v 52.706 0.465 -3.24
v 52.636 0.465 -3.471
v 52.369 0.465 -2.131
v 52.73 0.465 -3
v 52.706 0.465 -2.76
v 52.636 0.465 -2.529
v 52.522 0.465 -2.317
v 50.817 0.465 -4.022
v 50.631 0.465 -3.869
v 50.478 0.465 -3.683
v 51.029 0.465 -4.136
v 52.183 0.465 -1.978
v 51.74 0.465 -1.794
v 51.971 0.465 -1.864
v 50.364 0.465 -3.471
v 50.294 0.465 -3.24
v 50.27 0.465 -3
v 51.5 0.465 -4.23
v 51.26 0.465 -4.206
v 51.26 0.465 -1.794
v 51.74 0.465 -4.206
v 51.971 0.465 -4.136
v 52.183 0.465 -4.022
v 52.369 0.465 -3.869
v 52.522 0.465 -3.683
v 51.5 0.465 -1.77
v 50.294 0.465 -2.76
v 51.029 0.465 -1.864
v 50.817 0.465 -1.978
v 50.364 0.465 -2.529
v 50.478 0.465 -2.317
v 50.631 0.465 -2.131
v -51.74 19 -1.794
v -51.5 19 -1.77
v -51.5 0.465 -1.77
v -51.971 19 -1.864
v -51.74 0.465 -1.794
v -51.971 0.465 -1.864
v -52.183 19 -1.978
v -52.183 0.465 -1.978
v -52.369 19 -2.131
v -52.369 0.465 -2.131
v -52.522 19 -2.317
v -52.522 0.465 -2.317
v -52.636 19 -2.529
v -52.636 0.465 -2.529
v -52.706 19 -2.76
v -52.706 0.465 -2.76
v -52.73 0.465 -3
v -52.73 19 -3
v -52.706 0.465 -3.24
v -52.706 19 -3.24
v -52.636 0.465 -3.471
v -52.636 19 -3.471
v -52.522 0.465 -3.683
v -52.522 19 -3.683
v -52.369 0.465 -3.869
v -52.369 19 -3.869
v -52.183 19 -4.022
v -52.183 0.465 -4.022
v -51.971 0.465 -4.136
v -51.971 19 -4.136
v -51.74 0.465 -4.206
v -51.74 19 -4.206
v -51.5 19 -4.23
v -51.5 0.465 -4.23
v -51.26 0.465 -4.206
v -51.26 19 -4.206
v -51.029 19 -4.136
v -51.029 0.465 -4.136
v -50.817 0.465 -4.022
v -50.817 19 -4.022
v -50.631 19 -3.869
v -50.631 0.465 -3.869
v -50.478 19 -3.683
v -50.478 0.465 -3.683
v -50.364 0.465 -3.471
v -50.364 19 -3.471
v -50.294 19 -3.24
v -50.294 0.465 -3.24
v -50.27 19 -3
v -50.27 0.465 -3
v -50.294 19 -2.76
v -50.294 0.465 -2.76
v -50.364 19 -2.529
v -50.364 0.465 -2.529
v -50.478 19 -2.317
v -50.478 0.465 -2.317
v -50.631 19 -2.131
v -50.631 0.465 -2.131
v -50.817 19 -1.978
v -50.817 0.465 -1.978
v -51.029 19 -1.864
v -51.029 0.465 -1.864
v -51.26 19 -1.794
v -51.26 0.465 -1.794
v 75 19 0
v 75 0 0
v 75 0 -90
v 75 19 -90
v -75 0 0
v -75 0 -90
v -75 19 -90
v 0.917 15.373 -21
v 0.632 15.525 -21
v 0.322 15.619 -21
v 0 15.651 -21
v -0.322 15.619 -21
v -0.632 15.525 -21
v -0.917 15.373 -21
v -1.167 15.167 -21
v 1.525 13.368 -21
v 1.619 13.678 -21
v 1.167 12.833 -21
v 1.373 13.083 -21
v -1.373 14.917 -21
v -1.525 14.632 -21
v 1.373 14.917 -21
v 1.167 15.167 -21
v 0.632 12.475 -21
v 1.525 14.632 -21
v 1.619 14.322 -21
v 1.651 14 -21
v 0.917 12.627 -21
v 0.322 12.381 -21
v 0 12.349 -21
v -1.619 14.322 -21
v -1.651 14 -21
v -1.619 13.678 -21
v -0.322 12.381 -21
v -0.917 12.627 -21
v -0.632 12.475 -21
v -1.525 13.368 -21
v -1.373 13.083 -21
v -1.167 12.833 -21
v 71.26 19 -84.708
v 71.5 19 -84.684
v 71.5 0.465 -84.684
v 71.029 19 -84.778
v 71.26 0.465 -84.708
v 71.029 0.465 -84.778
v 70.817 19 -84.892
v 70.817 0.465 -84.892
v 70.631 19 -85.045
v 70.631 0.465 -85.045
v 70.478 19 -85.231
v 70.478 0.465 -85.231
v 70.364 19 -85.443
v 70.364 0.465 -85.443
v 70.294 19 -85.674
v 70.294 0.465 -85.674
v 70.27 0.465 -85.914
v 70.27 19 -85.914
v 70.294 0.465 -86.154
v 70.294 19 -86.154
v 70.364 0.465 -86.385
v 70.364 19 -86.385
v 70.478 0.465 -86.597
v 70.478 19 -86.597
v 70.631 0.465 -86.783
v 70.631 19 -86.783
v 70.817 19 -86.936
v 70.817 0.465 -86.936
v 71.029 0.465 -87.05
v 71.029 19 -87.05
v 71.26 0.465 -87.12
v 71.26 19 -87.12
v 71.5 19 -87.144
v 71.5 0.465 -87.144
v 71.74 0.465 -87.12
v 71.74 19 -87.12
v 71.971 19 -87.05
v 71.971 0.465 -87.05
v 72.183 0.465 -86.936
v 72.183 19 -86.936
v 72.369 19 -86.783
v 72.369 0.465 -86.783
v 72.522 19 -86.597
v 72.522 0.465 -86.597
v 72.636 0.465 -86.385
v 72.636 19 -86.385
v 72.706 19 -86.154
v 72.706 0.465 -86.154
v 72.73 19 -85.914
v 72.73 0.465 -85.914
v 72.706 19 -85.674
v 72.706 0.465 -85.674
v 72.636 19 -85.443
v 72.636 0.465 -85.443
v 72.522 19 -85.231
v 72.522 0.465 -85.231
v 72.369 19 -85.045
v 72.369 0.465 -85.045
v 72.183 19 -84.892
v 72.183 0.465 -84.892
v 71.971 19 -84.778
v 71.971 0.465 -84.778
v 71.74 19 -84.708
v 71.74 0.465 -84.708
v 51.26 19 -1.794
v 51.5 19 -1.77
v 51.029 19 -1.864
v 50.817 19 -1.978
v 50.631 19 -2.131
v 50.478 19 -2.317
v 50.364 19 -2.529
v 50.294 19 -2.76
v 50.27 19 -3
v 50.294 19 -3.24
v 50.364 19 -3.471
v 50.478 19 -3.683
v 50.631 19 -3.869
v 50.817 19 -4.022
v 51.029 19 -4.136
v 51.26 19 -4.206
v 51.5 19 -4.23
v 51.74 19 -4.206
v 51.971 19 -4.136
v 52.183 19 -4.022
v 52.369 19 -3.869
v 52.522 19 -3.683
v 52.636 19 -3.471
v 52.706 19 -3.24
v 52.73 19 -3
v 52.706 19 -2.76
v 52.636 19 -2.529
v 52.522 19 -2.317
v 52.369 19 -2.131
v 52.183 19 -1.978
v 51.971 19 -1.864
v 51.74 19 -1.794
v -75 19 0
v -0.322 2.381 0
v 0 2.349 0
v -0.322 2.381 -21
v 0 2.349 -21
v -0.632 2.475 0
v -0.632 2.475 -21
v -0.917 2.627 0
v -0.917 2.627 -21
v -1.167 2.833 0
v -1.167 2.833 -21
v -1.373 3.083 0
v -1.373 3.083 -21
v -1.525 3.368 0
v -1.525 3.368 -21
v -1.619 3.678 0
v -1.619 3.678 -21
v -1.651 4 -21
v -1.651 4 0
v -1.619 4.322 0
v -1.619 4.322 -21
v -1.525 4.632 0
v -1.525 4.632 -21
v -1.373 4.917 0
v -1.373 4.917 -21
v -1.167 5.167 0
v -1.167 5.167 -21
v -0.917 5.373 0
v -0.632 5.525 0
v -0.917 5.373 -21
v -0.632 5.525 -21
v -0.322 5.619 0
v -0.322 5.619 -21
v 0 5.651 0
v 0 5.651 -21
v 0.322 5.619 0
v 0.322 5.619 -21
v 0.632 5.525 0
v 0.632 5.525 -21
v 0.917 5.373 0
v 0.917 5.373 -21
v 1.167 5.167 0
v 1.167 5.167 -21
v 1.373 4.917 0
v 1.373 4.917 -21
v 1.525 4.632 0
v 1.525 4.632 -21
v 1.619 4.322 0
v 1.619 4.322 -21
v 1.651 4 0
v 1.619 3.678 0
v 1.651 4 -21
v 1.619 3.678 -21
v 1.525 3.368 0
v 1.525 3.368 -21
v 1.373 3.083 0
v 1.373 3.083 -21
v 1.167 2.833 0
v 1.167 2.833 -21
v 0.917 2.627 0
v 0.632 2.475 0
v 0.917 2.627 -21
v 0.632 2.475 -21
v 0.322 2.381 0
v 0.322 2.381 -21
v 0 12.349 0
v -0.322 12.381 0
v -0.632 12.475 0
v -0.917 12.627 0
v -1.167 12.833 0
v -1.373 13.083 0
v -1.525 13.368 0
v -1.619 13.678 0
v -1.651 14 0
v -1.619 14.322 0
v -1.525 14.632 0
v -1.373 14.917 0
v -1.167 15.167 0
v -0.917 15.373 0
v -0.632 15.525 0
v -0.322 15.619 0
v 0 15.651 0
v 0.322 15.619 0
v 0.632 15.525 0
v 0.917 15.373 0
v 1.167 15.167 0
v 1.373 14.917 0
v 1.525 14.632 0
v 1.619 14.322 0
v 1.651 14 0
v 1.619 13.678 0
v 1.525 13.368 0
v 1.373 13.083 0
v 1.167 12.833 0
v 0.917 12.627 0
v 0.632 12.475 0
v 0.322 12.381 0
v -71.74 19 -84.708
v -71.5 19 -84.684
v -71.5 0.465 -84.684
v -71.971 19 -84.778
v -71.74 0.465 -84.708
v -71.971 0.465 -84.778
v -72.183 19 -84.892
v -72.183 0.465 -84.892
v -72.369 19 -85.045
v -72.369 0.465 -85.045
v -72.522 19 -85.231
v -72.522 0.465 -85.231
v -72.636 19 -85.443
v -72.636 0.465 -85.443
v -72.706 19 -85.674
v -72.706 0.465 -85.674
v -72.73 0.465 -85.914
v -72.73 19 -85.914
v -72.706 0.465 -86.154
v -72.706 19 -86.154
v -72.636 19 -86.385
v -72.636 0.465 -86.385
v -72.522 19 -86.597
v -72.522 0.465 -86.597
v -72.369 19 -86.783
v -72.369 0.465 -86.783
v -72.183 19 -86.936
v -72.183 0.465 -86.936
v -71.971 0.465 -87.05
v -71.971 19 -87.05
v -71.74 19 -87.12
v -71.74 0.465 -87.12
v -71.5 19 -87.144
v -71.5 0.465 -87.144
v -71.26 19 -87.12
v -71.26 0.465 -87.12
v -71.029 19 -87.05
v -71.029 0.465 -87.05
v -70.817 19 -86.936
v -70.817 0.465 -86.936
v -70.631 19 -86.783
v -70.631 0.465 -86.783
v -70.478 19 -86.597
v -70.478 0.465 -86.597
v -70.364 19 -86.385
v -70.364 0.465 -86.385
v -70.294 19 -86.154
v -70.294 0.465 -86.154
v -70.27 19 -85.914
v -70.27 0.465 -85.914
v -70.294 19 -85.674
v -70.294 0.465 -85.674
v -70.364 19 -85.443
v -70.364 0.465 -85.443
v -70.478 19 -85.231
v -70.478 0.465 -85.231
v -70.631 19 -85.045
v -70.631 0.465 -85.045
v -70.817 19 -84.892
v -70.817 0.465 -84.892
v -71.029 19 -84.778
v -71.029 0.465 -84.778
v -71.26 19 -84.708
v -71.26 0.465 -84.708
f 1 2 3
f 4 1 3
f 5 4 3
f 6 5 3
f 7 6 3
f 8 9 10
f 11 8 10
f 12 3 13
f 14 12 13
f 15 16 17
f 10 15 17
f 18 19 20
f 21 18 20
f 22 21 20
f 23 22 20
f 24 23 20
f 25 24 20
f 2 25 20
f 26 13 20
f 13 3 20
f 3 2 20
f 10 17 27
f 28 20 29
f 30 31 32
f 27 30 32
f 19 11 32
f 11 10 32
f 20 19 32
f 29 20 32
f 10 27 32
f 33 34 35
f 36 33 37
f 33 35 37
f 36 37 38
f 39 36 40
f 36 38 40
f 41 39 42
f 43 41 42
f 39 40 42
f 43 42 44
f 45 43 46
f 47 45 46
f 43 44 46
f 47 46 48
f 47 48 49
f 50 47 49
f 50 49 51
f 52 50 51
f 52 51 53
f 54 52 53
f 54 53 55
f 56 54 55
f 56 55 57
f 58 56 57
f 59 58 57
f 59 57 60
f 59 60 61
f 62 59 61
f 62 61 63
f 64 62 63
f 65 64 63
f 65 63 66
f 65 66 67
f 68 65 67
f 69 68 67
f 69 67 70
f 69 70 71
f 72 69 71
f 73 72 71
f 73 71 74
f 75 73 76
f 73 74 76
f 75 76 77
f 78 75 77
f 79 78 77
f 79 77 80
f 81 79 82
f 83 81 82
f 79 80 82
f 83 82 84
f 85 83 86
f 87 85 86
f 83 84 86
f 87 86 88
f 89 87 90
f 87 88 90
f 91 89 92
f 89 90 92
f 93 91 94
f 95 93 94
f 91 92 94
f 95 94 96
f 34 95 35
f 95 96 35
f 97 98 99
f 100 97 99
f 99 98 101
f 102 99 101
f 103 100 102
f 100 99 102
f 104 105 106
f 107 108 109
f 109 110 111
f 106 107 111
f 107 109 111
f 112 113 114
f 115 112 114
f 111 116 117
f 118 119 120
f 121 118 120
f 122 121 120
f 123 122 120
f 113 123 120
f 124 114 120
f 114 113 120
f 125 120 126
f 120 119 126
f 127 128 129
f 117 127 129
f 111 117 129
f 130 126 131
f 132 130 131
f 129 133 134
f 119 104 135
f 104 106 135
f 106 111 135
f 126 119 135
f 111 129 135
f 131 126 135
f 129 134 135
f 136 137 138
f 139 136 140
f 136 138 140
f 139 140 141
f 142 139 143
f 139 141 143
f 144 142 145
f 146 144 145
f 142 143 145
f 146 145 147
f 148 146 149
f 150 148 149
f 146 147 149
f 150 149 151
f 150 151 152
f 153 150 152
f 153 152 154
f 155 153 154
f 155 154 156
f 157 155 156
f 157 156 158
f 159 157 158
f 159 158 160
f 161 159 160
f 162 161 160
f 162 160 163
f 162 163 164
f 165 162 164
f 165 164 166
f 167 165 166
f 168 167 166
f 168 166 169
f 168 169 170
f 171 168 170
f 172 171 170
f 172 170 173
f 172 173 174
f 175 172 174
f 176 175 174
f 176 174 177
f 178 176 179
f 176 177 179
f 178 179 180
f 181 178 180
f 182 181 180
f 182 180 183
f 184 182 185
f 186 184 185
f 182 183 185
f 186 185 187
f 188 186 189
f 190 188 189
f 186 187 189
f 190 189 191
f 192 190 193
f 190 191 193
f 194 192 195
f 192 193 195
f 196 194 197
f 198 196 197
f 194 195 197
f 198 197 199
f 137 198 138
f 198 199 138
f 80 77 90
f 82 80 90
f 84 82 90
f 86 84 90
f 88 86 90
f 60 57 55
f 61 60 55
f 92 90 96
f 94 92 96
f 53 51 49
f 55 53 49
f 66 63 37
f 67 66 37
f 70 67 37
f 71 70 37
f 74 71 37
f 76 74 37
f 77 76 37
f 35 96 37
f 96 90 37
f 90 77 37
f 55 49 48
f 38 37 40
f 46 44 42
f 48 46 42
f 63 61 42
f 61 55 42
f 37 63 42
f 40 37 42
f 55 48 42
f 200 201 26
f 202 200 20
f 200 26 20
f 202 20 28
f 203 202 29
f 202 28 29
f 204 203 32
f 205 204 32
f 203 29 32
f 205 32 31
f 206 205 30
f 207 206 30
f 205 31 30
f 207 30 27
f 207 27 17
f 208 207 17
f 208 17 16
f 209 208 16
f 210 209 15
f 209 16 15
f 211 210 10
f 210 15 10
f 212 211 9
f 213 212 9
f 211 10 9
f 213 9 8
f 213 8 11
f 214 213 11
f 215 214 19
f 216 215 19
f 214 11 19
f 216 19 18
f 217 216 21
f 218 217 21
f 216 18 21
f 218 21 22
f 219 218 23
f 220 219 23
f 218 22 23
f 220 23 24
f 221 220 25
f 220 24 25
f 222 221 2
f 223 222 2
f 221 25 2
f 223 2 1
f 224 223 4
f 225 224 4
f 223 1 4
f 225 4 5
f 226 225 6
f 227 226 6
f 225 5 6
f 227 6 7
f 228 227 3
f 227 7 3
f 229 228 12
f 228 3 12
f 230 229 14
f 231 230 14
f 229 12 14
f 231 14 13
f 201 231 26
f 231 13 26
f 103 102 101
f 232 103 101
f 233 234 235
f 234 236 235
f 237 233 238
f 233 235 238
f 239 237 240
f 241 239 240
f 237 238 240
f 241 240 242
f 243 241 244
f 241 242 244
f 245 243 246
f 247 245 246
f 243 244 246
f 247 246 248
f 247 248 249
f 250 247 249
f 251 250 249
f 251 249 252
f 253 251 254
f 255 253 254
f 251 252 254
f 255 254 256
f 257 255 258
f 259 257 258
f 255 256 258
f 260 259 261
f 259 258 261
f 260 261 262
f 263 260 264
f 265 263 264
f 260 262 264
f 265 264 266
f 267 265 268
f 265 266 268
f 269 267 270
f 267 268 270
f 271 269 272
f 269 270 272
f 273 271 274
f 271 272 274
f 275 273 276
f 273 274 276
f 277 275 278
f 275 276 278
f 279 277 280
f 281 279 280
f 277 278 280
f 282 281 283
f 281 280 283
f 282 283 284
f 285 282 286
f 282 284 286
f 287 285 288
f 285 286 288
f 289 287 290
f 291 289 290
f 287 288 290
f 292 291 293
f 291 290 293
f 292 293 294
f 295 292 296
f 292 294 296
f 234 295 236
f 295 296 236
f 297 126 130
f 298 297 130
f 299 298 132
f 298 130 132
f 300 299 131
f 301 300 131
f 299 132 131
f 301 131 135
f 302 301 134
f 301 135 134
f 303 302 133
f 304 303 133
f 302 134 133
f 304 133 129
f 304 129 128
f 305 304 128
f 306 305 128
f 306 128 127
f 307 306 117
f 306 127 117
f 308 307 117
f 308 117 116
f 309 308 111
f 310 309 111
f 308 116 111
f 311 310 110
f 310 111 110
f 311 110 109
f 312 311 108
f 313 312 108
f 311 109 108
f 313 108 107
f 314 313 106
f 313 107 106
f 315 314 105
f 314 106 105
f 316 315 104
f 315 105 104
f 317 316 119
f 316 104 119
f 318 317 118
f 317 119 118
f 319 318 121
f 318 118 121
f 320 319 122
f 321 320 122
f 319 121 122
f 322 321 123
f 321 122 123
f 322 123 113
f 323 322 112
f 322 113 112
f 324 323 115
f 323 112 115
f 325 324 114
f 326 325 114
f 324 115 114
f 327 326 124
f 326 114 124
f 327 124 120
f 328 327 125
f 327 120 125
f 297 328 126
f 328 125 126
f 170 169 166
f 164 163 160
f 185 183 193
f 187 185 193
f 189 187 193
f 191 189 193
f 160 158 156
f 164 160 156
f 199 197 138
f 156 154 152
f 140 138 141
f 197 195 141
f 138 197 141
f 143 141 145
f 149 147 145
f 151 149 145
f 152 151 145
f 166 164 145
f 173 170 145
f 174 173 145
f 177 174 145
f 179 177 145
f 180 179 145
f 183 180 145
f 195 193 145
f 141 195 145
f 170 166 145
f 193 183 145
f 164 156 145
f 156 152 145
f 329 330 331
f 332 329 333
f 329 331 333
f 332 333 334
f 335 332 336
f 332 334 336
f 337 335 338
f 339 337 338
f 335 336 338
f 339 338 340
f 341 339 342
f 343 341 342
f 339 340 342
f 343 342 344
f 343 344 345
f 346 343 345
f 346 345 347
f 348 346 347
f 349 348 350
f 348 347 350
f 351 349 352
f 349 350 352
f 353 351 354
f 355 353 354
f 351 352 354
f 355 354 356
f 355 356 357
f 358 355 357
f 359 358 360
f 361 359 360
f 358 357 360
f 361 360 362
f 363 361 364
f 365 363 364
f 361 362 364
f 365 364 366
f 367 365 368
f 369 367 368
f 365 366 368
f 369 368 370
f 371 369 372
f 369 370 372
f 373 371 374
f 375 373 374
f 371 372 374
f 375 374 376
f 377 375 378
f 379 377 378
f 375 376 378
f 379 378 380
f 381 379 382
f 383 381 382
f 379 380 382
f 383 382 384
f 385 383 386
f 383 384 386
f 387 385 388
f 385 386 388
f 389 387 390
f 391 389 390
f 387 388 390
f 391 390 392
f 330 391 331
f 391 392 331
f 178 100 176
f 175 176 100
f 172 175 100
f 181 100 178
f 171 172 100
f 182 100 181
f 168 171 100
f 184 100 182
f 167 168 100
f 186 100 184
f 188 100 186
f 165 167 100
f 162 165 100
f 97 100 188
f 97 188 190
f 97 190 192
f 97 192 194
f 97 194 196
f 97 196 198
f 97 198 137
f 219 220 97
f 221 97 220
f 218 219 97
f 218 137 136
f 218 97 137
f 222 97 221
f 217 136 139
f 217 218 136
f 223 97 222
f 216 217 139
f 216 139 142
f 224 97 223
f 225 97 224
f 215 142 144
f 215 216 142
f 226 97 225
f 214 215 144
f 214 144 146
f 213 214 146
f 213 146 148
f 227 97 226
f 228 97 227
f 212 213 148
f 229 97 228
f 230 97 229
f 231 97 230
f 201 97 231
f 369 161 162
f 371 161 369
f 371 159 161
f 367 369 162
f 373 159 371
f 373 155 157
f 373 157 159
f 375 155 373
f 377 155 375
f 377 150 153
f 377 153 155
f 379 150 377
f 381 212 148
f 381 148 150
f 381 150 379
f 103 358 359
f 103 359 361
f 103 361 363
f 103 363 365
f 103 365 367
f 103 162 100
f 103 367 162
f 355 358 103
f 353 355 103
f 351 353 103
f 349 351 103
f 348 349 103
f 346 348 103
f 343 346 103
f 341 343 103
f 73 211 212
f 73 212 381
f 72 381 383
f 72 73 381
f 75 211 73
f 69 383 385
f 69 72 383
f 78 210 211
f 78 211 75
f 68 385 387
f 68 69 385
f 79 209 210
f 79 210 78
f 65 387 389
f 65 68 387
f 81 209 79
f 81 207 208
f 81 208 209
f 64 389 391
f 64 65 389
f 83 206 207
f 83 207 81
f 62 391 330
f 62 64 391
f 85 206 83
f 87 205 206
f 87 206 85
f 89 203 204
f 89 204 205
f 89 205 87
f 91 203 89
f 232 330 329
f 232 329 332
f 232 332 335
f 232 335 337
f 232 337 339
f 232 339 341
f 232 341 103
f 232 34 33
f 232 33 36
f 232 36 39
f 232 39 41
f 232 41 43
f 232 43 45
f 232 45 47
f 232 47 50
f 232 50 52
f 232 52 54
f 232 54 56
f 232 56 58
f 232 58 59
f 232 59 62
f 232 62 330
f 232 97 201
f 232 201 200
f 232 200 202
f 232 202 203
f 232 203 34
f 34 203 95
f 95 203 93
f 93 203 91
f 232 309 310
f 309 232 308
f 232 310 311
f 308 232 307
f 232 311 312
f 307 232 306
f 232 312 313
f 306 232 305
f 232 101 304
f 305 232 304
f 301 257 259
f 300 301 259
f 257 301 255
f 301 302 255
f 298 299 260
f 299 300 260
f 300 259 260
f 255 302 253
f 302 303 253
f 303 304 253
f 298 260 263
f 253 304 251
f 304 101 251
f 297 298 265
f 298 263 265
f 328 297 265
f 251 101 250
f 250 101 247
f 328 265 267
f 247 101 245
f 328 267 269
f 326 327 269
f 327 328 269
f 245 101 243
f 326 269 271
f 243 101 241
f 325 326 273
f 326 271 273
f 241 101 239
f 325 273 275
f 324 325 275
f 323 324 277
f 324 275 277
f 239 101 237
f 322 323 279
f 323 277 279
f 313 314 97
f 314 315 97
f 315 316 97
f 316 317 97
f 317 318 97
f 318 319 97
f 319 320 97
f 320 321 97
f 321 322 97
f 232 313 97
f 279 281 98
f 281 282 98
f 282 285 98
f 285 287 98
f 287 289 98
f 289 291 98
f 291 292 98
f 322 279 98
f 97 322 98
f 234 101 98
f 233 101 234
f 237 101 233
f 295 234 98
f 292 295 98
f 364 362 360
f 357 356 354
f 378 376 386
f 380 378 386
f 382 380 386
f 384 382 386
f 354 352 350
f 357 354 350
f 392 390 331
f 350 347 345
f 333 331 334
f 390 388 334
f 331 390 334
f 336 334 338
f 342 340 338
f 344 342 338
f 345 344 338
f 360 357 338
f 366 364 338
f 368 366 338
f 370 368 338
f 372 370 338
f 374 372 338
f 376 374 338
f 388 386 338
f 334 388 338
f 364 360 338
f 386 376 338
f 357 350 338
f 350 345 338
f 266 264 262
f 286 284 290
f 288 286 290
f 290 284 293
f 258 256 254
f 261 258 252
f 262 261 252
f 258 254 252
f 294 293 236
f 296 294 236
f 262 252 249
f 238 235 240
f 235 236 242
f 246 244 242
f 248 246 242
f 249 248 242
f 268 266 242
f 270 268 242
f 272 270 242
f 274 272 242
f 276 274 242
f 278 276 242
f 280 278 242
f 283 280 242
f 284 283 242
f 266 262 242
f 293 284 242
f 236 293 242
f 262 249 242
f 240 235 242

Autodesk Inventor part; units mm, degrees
ref_plane "YZ Plane" through (0, 0, 0) normal (1, 0, 0) x (0, 1, 0)
ref_plane "XZ Plane" through (0, 0, 0) normal (0, 1, 0) x (-1, 0, 0)
ref_plane "XY Plane" through (0, 0, 0) normal (0, 0, 1) x (1, 0, 0)
sketch "Sketch1" plane through (0, 0, 0) normal (0, 1, 0) x (-1, 0, 0)
  line L0 (75, 0) -> (-75, 0)
  line L1 (-75, 0) -> (-75, -90)
  line L2 (-75, -90) -> (75, -90)
  line L3 (75, -90) -> (75, 0)
  point P0 (0, 0)
  point P1 (0, 0)
  dimension "d0" = 150
  dimension "d1" = 90
extrude "Extrusion1" add sketch "Sketch1" along normal blind 19
sketch "Sketch2" plane through (-75, 0, 0) normal (0, 0, 1) x (1, 0, 0)
  line L0 (0, 0) -> (150, 0) projected
  line L1 (150, 0) -> (150, 19) projected
  line L2 (0, 19) -> (150, 19) projected
  line L3 (0, 0) -> (0, 19) projected
  point P0 (75, 0)
  point P1 (75, 4)
  point P2 (75, 14)
  dimension "d4" = 4
  dimension "d5" = 14
  dimension "d6" = 75
  dimension "d7" = 75
hole "Hole1" at (0, 4, 0) at (0, 14, 0) direction (0, 0, -1) diameter 3.302 depth 21 thread size "8-32 UNC" class "2B" standard "ANSI Unified Screw Threads"
sketch "Sketch3" plane through (0, 19, 0) normal (0, 1, 0) x (1, 0, 0)
  line L0 (-75, 0) -> (75, 0) projected
  line L1 (75, 0) -> (75, 90) projected
  line L2 (75, 90) -> (-75, 90) projected
  line L3 (-75, 90) -> (-75, 0) projected
  point P0 (0, 0)
  point P1 (-71.5, 85.914)
  point P2 (71.5, 85.914)
  point P3 (51.5, 3)
  point P4 (-51.5, 3)
  dimension "d15" = 143
  dimension "d16" = 4.086
  dimension "d17" = 3.5
  dimension "d18" = 4.086
  dimension "d20" = 23.5
  dimension "d21" = 3
  dimension "d22" = 3
  dimension "d39" = 23.5
hole "Hole2" at (-71.5, 19, -85.914) at (71.5, 19, -85.914) at (51.5, 19, -3) at (-51.5, 19, -3) direction (0, -1, 0) diameter 2.459 depth 18.535 thread size "M3x0.5" class "6H" standard "ANSI Metric M Profile"
properties part number "Bas"
